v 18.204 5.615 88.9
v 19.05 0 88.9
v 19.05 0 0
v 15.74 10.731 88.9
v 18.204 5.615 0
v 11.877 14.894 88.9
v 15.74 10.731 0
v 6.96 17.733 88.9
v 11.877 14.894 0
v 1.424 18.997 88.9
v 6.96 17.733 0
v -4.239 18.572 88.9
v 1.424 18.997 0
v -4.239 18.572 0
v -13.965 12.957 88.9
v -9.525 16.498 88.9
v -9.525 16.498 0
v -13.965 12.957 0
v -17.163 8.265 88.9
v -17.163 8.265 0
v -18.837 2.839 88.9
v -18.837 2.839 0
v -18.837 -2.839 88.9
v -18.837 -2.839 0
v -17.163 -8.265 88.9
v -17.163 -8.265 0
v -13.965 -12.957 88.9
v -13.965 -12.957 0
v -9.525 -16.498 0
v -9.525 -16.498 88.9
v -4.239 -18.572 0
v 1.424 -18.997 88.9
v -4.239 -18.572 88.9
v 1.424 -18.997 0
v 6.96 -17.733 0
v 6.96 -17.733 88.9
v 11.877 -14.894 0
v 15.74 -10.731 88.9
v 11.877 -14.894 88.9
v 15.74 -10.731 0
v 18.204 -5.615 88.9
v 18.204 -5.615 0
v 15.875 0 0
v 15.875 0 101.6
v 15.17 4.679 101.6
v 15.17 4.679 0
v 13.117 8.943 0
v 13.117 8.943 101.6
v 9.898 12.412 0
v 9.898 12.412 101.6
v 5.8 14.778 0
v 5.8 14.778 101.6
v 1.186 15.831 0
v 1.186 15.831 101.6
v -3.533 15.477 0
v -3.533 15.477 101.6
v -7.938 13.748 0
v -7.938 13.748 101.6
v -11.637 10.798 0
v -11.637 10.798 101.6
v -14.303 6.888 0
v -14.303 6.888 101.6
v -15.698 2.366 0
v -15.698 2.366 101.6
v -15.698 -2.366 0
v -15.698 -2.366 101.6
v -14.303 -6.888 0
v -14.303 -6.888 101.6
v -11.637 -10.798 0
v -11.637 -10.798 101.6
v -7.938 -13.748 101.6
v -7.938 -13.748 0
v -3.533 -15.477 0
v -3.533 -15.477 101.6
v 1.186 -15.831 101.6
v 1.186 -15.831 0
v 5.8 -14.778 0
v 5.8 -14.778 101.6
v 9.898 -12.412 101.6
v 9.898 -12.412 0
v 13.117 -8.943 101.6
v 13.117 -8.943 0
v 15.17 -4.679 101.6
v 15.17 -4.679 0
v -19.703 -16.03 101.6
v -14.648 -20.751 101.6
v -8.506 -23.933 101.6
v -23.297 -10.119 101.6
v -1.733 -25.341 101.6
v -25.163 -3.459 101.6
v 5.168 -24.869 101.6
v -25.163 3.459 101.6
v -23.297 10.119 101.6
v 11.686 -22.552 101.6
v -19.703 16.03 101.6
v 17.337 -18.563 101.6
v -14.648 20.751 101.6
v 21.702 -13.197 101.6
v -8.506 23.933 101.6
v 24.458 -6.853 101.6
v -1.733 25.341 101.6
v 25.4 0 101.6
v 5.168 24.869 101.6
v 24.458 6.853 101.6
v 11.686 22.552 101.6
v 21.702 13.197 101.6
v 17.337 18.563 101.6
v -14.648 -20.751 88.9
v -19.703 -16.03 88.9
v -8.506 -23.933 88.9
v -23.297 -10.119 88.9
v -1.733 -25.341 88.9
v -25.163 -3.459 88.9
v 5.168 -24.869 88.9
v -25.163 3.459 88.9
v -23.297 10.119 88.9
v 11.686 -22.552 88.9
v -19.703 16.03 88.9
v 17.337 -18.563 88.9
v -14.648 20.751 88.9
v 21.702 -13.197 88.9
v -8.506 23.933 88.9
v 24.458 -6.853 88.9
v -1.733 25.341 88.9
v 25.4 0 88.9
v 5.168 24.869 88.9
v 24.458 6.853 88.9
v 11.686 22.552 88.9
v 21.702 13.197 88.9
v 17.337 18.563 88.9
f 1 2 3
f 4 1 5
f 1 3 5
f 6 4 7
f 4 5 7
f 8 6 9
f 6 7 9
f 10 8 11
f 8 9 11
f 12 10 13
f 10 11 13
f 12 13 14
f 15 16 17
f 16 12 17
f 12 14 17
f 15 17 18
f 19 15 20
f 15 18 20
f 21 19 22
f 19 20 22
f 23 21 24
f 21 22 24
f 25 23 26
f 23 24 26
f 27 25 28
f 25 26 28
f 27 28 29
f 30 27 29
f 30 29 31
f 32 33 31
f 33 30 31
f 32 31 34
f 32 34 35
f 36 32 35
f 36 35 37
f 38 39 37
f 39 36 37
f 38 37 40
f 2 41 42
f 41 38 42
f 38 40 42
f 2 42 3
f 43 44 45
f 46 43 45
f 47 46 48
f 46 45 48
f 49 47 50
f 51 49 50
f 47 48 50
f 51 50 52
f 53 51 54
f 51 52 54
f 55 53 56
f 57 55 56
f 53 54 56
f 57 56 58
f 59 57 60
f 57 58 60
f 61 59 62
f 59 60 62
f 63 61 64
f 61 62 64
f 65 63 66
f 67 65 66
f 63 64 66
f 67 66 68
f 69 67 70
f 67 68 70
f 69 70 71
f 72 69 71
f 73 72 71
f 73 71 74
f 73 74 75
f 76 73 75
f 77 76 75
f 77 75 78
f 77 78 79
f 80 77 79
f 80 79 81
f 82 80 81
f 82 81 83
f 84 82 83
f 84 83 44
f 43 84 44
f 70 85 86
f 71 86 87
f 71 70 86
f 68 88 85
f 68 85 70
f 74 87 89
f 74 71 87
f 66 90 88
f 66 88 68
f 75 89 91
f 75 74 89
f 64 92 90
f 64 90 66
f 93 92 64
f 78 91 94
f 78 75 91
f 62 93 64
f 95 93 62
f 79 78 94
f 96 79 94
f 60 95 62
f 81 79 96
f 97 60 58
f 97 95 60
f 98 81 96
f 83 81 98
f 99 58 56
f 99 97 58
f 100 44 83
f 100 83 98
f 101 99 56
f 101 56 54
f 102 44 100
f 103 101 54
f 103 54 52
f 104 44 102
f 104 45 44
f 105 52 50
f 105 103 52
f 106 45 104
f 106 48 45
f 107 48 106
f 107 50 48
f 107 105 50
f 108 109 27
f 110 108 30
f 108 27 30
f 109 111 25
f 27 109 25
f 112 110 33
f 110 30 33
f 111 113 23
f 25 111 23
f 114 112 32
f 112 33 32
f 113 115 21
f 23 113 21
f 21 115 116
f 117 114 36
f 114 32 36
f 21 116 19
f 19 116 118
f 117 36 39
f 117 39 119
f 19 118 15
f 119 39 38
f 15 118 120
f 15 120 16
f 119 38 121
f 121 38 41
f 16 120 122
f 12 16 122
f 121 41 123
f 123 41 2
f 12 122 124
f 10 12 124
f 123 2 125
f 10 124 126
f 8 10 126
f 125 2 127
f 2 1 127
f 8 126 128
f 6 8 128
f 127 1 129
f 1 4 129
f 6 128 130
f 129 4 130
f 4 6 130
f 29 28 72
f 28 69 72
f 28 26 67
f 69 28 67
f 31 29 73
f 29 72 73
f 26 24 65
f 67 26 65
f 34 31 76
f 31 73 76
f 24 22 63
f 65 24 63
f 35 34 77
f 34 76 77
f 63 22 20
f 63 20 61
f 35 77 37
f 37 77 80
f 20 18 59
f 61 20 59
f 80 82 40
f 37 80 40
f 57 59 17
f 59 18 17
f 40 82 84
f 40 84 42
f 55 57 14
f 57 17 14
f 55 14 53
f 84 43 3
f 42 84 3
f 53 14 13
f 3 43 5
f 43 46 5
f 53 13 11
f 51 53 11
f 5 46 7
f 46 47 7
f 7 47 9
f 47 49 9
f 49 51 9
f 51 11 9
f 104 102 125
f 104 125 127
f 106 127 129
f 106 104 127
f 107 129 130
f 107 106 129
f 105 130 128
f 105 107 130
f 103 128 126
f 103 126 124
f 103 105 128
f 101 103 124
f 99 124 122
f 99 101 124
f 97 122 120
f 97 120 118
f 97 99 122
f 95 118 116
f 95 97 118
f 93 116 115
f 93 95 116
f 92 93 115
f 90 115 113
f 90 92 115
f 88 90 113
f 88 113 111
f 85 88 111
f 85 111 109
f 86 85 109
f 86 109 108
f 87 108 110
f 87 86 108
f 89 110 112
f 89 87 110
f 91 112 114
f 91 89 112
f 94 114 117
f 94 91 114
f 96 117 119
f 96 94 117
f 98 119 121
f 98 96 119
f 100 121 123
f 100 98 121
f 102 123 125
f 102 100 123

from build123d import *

# Parameters (mm, degrees)
SKETCH1_R           = 19.05
BOSS_EXTRUDE1_DEPTH = 101.6
SKETCH2_R           = 15.875
CUT_EXTRUDE1_DEPTH  = 101.6
SKETCH3_R           = 25.4
BOSS_EXTRUDE2_DEPTH = 12.7
SKETCH4_R           = 15.875
CUT_EXTRUDE2_DEPTH  = 12.7


with BuildPart() as part:
    # Sketch1 → Boss-Extrude1 (new body)
    with BuildSketch(Plane.XY):
        Circle(SKETCH1_R)
    extrude(amount=BOSS_EXTRUDE1_DEPTH)

    # Sketch2 → Cut-Extrude1 (cut)
    with BuildSketch(Plane.XY.offset(101.6)):
        Circle(SKETCH2_R)
    extrude(amount=-CUT_EXTRUDE1_DEPTH, mode=Mode.SUBTRACT)

    # Sketch3 → Boss-Extrude2 (add)
    with BuildSketch(Plane.XY.offset(101.6)):
        Circle(SKETCH3_R)
    extrude(amount=-BOSS_EXTRUDE2_DEPTH)

    # Sketch4 → Cut-Extrude2 (cut)
    with BuildSketch(Plane.XY.offset(101.6)):
        Circle(SKETCH4_R)
    extrude(amount=-CUT_EXTRUDE2_DEPTH, mode=Mode.SUBTRACT)


solid = part.part
